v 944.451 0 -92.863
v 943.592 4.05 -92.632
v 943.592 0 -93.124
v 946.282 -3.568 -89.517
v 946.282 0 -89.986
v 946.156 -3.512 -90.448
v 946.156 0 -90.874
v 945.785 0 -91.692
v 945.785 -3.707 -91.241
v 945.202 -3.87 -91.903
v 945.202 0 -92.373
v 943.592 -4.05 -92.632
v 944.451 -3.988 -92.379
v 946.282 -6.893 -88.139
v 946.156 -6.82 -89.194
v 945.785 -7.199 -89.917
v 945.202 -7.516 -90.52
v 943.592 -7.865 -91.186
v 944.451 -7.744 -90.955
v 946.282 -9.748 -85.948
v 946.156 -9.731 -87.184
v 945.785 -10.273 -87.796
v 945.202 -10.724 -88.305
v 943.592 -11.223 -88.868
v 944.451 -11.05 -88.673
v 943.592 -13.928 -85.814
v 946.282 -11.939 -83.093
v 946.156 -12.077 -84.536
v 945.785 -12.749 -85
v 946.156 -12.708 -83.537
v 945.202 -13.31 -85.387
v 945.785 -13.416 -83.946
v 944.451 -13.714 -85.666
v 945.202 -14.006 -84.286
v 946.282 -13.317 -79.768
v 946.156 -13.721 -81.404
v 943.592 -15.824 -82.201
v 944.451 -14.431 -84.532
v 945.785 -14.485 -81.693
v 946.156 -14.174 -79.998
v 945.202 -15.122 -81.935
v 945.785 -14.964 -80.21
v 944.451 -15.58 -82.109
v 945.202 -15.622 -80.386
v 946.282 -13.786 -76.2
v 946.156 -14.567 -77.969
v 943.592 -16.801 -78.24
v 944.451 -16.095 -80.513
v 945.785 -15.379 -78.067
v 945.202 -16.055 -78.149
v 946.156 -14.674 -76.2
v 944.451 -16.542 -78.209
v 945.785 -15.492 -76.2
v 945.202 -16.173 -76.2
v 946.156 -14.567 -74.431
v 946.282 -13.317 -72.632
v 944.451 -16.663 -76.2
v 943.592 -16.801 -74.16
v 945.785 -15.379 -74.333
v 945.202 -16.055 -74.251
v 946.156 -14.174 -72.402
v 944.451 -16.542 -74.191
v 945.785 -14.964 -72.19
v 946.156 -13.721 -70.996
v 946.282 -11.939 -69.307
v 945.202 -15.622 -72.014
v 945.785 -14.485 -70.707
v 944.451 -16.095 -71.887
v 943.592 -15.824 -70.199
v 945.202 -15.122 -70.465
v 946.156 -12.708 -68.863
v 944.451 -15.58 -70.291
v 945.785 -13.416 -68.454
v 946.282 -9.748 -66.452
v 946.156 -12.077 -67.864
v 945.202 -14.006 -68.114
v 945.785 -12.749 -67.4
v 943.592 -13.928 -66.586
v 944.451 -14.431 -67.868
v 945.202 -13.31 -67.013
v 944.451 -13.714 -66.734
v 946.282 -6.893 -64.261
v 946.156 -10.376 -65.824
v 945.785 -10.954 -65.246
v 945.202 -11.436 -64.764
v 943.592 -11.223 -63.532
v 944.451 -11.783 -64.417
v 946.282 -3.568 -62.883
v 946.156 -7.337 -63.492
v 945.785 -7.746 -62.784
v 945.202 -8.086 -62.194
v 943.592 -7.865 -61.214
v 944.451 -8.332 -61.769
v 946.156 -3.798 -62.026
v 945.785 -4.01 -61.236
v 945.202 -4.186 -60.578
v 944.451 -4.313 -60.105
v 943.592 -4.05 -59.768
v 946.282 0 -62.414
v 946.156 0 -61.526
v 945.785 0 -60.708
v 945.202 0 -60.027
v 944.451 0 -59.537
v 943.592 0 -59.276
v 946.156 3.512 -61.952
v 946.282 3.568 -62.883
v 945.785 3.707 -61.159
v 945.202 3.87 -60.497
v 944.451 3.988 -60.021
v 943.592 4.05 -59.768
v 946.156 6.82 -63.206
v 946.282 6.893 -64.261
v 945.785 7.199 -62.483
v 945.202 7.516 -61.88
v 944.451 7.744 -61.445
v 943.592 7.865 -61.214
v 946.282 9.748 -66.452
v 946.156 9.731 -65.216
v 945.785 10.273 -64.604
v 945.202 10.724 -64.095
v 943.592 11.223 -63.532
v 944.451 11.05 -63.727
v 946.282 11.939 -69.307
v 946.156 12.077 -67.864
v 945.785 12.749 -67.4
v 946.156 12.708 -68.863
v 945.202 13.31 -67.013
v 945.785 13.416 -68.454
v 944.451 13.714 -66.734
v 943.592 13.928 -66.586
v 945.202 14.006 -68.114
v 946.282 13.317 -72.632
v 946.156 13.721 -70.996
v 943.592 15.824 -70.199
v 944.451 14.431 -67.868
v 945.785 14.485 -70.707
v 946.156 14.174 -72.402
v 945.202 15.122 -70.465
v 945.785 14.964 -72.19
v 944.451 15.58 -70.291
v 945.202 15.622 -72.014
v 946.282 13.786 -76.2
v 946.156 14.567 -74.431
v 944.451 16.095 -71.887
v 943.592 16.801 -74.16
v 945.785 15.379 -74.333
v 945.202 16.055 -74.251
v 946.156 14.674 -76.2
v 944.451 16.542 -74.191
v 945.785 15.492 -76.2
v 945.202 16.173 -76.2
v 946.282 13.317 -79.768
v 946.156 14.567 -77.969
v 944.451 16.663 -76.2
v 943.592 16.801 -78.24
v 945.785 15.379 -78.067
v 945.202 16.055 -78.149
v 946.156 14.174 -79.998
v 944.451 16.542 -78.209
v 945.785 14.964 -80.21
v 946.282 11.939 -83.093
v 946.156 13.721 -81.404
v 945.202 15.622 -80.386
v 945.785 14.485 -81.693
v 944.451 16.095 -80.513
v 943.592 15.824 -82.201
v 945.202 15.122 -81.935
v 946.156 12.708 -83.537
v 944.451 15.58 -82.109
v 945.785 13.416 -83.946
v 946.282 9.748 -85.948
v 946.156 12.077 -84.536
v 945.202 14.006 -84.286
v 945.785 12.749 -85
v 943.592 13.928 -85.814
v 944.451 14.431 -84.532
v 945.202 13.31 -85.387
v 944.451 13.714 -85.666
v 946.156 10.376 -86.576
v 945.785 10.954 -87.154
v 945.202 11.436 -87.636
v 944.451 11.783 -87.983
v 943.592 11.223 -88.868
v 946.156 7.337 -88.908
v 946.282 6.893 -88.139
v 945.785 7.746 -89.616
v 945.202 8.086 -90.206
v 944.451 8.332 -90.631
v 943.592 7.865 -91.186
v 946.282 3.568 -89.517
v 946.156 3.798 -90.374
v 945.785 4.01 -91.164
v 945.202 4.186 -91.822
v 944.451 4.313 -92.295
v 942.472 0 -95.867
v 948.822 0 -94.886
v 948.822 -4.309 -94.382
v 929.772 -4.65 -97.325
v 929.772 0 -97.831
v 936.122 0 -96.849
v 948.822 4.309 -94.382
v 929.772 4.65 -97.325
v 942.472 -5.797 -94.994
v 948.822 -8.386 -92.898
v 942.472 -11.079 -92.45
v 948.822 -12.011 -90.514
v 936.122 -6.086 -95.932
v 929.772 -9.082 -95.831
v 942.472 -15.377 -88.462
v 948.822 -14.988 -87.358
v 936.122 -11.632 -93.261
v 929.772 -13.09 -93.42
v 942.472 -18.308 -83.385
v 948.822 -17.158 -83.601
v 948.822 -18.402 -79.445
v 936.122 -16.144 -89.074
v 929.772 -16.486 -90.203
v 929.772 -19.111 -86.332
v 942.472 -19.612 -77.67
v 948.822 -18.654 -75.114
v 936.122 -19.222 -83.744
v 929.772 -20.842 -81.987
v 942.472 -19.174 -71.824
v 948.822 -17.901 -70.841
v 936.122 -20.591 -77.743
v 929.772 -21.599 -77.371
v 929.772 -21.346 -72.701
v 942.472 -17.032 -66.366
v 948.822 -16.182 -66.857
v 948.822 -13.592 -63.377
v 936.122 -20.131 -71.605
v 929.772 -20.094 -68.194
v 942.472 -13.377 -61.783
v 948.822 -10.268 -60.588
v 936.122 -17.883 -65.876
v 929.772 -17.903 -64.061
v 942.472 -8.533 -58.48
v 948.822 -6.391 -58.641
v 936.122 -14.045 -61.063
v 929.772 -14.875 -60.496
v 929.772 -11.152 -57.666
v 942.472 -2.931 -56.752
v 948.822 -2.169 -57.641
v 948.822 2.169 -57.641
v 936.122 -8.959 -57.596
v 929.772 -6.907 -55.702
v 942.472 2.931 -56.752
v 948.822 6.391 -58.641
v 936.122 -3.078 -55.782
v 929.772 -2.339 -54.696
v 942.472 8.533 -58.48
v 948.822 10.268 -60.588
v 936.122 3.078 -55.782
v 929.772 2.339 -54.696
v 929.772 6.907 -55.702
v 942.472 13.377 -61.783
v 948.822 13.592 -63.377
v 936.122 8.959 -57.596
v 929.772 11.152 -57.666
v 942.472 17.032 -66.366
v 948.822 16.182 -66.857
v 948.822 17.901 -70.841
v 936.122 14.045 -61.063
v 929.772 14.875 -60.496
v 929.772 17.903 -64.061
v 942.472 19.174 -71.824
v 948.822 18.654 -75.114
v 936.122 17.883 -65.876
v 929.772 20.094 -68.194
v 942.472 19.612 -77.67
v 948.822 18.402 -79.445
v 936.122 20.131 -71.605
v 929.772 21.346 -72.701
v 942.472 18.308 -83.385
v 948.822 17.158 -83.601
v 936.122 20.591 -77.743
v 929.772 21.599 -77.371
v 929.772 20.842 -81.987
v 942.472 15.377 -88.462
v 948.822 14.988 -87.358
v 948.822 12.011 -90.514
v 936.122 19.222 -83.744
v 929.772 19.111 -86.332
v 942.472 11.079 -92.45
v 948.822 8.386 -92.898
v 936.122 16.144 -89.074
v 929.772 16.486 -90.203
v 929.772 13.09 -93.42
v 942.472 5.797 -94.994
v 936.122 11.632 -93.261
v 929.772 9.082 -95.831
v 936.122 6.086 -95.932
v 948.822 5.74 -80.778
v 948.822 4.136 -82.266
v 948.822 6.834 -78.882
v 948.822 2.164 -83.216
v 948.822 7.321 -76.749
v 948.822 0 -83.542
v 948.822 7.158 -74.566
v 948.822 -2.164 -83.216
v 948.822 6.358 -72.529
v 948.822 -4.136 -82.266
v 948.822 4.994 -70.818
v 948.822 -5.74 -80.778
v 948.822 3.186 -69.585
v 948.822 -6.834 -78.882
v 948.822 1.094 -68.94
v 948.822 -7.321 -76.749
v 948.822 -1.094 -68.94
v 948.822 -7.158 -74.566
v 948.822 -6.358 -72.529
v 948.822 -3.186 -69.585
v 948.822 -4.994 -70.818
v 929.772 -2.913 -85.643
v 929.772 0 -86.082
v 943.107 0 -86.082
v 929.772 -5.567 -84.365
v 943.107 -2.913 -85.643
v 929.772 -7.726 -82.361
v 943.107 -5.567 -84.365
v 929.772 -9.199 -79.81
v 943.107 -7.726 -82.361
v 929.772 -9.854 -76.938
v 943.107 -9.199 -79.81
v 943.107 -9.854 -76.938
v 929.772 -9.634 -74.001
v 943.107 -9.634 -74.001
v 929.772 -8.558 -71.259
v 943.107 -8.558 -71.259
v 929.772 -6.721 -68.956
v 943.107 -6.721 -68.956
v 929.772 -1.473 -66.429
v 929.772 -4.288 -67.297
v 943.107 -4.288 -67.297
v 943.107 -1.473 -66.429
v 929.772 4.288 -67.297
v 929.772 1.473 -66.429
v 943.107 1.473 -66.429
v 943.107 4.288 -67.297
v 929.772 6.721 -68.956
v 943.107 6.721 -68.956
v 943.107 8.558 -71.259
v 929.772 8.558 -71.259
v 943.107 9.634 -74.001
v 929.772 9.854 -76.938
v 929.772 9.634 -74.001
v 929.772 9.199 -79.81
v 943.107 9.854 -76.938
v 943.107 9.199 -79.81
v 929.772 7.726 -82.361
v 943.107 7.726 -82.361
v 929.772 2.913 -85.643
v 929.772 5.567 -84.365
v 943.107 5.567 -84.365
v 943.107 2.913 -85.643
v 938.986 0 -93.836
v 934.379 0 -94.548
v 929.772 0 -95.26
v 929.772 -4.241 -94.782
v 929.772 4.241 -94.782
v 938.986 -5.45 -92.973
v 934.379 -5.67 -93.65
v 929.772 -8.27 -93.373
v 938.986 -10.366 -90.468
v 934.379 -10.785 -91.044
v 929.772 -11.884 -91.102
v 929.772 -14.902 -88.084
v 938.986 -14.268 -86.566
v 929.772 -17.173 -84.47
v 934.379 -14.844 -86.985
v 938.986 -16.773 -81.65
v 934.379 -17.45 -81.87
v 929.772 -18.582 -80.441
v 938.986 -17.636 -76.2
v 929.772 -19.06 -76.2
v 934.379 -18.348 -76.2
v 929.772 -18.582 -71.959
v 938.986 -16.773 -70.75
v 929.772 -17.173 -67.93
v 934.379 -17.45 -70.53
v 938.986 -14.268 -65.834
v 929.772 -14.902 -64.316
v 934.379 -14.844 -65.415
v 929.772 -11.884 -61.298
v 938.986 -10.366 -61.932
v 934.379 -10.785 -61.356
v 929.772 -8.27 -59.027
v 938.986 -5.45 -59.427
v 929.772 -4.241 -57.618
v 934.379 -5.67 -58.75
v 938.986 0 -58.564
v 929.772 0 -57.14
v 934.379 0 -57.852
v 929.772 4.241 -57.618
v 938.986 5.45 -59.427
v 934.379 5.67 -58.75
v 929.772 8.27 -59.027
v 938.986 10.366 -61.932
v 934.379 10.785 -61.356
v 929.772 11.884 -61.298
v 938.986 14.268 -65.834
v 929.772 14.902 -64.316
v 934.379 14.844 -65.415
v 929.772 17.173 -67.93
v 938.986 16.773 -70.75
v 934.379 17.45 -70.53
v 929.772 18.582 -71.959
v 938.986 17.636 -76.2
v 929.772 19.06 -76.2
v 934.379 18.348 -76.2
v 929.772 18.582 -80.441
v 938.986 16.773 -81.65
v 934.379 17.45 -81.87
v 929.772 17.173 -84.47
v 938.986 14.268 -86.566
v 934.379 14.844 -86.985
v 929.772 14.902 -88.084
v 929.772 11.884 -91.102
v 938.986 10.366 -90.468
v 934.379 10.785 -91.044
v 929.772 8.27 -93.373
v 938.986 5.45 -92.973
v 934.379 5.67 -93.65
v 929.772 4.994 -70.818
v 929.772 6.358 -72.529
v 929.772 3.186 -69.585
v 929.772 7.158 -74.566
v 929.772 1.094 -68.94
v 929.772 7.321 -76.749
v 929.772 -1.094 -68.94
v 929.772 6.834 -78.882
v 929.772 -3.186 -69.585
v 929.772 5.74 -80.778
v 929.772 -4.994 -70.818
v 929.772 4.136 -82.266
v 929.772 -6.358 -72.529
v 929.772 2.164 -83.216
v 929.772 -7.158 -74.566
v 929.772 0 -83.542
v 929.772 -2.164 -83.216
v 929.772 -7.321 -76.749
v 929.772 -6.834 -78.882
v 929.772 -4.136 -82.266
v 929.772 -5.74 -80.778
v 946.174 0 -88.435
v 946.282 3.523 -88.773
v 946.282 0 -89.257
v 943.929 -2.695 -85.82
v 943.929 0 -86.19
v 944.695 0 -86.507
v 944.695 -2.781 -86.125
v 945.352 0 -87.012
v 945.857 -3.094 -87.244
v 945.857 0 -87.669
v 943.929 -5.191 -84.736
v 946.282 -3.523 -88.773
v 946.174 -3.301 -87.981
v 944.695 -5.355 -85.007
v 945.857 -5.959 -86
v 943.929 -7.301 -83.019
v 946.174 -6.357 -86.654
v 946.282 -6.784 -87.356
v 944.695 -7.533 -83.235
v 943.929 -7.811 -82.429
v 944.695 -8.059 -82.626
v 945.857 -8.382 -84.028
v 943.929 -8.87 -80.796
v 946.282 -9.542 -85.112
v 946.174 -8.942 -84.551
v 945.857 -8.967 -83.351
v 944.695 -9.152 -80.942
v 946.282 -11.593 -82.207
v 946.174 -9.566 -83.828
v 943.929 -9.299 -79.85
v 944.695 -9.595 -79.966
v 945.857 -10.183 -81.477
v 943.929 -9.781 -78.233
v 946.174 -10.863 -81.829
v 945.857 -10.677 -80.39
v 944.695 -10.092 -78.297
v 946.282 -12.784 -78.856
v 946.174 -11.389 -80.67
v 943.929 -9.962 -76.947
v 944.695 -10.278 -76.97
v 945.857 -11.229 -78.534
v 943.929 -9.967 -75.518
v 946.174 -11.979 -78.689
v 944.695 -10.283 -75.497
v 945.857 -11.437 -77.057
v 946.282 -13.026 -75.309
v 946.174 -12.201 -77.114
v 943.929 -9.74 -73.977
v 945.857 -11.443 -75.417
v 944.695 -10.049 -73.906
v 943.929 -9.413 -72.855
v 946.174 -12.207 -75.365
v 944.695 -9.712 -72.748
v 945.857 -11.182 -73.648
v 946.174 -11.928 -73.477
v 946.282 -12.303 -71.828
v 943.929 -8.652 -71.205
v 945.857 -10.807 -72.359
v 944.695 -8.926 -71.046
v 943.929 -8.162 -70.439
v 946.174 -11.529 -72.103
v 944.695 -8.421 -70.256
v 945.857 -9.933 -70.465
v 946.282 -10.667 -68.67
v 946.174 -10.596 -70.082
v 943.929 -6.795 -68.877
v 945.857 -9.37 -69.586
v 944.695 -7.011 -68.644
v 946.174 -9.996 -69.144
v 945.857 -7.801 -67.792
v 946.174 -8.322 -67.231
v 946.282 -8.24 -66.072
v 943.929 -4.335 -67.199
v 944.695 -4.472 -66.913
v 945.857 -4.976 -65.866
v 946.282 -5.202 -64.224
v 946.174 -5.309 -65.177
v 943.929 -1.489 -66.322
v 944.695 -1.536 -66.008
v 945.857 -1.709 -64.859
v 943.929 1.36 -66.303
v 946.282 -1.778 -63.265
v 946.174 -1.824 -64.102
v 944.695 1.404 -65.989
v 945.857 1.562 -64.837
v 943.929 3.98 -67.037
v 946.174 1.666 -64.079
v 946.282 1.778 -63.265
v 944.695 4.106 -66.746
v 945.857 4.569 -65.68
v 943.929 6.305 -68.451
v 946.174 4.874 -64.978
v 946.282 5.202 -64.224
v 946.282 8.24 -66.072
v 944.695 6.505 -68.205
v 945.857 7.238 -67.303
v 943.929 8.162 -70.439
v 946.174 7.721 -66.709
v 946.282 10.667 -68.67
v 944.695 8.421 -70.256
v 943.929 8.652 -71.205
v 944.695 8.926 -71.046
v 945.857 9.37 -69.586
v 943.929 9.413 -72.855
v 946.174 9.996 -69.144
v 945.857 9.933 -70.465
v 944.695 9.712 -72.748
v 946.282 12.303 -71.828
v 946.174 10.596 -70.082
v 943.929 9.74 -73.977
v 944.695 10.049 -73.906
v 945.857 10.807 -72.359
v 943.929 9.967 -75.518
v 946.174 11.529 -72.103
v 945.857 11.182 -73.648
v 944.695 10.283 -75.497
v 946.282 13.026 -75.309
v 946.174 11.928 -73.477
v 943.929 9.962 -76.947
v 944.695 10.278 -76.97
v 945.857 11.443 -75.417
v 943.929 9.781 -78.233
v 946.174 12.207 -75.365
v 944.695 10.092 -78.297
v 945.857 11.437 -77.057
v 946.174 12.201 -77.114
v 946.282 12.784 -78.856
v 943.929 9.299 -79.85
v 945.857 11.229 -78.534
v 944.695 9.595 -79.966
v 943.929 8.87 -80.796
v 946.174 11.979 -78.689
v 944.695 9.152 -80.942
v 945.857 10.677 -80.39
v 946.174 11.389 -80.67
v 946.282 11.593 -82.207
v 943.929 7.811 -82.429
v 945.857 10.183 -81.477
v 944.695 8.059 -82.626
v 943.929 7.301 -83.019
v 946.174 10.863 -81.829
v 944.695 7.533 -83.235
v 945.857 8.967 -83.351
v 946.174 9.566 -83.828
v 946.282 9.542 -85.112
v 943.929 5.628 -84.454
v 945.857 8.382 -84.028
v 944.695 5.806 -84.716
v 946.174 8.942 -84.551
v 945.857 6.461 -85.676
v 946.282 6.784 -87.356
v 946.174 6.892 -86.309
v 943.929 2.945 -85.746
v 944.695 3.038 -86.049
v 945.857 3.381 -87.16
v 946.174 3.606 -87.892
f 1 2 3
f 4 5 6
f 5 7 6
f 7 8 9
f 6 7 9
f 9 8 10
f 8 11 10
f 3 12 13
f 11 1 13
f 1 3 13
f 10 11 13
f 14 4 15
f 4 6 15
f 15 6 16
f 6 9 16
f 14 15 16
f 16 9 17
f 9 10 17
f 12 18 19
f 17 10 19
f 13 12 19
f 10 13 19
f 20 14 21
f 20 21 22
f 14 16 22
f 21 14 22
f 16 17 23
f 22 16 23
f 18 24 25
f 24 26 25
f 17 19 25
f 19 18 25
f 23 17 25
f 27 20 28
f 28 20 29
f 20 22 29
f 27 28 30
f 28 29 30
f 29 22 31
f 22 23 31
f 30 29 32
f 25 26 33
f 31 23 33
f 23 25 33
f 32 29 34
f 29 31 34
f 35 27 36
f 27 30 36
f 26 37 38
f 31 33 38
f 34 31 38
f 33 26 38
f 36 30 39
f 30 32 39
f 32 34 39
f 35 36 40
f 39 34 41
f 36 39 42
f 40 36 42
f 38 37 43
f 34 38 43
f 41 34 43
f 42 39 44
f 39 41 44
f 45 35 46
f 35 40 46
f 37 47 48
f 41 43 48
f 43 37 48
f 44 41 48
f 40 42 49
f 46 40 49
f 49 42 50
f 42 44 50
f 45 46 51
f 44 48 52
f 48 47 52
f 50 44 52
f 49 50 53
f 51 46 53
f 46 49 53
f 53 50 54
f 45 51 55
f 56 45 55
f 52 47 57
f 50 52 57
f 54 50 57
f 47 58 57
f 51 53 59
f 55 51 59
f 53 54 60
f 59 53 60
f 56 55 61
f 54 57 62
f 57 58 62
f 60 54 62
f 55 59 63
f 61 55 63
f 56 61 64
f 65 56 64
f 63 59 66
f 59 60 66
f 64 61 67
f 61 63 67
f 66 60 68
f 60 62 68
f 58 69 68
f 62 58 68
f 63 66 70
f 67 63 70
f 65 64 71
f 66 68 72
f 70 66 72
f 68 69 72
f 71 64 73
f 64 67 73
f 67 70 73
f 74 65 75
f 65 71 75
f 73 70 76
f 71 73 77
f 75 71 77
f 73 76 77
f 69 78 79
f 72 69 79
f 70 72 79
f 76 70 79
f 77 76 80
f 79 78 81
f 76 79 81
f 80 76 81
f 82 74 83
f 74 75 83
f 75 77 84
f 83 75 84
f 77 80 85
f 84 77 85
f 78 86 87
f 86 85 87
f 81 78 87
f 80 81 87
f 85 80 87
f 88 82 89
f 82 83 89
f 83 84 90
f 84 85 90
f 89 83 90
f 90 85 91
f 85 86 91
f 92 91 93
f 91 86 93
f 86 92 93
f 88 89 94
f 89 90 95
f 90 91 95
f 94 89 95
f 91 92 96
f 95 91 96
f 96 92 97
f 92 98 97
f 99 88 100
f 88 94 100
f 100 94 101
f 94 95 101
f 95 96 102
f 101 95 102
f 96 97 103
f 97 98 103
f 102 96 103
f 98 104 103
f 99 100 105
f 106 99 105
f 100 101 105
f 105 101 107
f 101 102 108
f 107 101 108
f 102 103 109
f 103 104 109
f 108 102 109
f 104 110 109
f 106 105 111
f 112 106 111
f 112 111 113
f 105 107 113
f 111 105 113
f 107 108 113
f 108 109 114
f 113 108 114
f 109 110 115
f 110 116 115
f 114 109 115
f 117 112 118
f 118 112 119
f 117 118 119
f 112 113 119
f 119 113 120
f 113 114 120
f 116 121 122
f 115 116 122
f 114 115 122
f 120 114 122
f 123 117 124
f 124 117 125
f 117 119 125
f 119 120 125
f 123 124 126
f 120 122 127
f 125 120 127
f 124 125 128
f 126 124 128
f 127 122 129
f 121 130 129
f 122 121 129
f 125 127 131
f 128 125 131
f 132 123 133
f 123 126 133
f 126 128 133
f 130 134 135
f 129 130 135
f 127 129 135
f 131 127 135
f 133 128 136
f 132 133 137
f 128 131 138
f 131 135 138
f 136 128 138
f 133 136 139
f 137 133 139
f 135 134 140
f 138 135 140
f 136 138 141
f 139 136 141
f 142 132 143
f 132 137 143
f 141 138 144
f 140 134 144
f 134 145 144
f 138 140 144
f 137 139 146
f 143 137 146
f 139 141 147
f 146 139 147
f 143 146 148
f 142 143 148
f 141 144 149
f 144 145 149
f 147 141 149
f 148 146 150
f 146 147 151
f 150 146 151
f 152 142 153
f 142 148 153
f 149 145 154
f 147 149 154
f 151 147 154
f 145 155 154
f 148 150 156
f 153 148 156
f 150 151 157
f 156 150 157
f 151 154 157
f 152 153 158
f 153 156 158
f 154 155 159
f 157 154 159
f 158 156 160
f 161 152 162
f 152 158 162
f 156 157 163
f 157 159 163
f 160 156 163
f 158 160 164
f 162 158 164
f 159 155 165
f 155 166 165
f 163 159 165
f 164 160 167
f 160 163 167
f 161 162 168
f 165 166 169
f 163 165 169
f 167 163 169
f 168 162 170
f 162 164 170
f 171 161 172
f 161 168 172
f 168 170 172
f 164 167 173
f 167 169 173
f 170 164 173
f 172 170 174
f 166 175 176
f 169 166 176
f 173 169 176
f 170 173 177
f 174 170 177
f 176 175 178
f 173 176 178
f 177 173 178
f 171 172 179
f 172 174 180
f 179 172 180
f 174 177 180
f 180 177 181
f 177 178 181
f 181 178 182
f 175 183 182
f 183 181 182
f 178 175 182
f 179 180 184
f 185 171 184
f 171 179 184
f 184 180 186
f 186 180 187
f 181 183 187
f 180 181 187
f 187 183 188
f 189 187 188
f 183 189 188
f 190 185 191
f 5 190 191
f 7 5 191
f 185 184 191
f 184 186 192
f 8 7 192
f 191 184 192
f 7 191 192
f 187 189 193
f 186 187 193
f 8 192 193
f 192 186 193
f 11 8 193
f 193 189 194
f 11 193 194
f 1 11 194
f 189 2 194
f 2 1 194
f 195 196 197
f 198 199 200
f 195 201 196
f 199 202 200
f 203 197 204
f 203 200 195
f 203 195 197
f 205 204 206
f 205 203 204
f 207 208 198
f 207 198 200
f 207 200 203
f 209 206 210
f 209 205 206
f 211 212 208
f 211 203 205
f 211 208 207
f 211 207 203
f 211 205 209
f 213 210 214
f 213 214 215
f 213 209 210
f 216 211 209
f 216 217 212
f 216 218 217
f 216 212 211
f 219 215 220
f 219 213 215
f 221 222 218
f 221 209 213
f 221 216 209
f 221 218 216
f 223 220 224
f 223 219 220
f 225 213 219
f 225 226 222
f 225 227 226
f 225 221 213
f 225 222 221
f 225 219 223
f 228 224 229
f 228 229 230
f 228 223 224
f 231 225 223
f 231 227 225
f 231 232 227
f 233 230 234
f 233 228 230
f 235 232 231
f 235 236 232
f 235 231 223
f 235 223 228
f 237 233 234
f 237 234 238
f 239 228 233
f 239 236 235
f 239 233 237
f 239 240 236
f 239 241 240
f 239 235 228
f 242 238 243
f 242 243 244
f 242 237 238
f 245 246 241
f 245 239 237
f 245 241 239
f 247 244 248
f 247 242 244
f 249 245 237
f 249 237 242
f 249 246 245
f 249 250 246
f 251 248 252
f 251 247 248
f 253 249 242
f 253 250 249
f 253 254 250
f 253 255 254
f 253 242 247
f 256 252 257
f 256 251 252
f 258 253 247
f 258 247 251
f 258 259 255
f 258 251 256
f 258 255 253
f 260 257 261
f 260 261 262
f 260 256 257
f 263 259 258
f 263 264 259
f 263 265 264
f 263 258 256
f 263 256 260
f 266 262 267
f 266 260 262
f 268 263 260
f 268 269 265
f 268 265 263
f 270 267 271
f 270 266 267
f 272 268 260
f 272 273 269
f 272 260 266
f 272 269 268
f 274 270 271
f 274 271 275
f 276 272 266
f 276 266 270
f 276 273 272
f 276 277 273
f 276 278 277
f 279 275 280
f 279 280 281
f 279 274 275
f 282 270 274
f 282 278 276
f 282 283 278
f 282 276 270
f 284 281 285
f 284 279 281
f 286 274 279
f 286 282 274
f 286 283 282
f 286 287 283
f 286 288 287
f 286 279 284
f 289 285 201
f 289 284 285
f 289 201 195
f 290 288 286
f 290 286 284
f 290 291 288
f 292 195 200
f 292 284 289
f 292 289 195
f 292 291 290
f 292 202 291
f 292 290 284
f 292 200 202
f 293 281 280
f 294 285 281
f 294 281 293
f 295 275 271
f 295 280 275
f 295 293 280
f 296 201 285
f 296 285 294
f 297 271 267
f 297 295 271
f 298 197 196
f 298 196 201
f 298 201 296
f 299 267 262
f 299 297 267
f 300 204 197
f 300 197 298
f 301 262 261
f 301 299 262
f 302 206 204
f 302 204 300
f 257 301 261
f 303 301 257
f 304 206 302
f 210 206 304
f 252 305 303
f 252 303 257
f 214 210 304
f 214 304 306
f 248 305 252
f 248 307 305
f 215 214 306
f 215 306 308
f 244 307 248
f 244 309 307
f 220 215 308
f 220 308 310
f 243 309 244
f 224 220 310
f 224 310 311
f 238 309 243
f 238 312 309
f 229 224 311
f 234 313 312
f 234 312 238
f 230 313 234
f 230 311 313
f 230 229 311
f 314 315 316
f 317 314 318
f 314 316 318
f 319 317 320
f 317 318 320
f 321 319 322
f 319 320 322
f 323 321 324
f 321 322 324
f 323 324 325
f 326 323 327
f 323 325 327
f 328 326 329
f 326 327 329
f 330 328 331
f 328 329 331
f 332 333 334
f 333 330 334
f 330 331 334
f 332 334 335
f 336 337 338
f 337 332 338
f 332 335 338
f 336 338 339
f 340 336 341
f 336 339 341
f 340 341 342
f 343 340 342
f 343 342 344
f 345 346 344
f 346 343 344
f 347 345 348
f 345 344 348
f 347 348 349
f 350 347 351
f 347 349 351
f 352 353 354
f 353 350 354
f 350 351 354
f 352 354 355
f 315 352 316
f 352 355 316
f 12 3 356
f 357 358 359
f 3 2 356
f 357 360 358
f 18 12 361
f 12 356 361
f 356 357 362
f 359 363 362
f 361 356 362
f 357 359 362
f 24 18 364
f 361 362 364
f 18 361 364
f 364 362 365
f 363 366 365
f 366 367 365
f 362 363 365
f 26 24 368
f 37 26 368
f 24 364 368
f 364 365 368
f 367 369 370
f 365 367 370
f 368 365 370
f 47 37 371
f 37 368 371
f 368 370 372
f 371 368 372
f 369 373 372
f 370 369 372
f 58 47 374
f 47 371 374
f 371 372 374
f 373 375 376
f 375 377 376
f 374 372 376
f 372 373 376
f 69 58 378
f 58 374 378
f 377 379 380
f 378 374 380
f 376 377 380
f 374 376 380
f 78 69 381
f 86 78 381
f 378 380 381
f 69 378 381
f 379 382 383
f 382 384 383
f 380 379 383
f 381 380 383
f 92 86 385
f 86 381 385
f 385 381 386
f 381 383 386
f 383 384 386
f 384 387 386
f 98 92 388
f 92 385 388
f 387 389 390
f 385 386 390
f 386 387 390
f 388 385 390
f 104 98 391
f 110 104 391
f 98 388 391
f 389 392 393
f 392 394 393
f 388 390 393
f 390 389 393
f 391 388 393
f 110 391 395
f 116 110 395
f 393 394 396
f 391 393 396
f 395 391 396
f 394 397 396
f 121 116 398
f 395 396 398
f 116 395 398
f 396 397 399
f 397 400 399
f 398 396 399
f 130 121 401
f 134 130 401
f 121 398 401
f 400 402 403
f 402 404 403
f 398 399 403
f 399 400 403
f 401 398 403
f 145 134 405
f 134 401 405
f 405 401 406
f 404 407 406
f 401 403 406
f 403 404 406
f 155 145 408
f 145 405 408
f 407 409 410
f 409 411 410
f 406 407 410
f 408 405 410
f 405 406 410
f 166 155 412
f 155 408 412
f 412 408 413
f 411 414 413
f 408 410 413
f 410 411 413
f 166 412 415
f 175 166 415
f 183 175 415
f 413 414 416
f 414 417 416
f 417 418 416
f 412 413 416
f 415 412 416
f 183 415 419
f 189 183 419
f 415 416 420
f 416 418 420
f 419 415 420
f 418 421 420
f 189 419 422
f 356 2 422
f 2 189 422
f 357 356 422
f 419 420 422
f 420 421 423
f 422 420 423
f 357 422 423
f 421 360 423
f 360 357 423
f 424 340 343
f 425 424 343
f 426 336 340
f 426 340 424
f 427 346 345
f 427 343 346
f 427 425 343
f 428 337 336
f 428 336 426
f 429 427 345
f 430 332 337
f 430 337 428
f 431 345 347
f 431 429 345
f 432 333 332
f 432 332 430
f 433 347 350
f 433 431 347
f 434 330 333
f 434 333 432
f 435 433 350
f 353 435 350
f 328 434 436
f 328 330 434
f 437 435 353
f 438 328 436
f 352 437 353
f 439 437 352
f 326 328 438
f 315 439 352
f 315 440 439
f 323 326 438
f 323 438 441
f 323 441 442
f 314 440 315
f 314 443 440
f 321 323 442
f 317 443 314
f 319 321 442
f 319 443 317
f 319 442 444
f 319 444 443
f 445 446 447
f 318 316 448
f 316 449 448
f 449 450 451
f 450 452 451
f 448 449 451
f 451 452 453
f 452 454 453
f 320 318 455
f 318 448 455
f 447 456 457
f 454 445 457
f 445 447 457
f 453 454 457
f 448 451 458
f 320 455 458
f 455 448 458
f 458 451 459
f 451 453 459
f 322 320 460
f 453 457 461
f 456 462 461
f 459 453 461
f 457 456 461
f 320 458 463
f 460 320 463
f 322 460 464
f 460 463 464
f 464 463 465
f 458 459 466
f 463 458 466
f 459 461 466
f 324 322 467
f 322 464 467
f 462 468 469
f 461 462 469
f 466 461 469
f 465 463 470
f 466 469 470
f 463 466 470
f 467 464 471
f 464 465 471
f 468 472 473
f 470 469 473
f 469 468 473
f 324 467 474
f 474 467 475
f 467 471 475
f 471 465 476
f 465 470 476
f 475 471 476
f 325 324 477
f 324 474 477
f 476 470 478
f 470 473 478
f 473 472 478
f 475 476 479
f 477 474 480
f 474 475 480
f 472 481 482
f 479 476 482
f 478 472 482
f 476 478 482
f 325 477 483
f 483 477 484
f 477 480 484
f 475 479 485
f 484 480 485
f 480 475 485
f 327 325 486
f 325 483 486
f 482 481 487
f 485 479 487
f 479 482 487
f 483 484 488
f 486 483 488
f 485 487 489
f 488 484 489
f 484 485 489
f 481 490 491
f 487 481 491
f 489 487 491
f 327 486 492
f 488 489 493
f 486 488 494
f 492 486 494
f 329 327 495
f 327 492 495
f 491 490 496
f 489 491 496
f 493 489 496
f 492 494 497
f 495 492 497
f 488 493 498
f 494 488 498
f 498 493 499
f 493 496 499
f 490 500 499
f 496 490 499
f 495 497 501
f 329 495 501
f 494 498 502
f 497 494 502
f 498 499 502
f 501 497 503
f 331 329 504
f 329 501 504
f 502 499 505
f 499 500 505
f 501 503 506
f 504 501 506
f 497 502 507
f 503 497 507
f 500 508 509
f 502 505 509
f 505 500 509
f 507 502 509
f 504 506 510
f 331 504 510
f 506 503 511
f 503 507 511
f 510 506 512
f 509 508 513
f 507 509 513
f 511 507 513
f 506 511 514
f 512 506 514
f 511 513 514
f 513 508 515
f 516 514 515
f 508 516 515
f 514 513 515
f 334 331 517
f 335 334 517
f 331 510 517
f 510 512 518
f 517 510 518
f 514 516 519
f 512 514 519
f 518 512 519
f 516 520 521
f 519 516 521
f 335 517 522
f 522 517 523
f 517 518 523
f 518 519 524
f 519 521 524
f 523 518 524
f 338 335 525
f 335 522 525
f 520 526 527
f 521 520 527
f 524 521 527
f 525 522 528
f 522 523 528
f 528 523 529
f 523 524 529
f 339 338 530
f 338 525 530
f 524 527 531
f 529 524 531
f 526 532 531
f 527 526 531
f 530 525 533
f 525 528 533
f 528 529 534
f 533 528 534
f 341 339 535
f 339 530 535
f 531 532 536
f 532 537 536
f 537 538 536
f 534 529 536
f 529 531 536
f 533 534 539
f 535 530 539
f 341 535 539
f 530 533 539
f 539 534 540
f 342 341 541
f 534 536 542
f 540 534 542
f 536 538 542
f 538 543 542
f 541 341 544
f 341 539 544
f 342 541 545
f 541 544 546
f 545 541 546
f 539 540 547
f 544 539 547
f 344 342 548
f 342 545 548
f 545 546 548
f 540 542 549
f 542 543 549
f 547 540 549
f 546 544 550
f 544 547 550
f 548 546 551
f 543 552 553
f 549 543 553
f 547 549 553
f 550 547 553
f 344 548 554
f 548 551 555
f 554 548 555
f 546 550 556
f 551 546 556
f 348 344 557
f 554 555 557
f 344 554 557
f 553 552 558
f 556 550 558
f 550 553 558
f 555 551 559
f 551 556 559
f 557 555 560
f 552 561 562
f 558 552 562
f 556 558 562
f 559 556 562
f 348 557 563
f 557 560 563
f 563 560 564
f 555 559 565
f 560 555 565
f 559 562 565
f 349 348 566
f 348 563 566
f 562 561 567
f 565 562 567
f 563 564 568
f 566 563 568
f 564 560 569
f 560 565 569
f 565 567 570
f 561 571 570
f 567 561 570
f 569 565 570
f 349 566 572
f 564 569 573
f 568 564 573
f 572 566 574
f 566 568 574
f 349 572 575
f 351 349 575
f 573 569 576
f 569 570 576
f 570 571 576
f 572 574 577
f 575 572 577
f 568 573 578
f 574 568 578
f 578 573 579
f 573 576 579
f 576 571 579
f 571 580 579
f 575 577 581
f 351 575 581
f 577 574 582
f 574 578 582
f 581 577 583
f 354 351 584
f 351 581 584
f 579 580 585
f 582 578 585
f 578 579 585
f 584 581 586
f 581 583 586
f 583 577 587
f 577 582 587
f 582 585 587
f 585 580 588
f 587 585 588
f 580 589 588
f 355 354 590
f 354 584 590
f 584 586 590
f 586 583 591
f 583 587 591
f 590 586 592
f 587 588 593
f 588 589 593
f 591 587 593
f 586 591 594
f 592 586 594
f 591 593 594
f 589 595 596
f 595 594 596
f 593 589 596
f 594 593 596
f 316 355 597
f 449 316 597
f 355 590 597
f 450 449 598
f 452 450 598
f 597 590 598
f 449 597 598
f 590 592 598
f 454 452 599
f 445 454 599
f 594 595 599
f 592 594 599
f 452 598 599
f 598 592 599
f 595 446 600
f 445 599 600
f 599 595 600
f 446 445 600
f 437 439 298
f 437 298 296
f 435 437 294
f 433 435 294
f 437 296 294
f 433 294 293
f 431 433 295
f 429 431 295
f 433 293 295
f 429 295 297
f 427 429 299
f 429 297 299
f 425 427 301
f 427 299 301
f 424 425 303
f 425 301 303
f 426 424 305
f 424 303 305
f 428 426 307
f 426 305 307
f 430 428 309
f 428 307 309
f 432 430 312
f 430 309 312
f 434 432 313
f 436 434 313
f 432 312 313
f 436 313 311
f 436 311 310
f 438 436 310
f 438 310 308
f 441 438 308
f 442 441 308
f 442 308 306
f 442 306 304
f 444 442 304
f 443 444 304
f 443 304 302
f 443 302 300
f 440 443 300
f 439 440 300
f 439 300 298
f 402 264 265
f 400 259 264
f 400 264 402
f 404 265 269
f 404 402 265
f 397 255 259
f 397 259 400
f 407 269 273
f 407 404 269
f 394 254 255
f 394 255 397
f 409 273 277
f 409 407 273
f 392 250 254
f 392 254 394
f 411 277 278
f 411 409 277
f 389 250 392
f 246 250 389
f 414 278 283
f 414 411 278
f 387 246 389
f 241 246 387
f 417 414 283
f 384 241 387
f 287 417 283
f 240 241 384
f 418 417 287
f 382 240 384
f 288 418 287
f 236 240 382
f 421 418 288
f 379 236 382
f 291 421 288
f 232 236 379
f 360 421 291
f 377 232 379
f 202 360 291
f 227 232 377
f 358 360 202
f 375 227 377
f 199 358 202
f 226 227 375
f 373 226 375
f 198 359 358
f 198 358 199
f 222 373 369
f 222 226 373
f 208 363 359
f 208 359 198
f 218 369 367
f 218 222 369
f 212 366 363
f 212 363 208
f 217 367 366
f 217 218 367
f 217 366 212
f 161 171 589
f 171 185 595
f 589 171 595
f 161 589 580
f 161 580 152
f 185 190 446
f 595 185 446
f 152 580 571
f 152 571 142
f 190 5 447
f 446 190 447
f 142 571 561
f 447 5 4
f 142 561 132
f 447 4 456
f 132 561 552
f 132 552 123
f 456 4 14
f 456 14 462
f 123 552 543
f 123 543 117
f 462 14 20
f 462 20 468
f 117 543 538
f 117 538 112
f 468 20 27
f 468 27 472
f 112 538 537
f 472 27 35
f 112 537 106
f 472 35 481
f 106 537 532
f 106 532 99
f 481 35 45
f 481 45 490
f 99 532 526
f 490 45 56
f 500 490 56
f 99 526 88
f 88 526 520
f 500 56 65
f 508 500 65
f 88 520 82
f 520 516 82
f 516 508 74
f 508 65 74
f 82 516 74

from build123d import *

# Parameters (mm, degrees)
TAPPED_HOLE_FOR_9_16_12_HELICOIL1_D = 14.68374


with BuildPart() as part:
    # Sketch1 → Revolve2 (revolve)
    with BuildSketch(Plane(origin=(0, 0, 0), x_dir=(1, 0, 0), z_dir=(0, 1, 0))):
        Polygon((929.772285353, 97.830519041), (929.772285353, 76.2), (948.822285353, 76.2), (948.822285353, 94.885801773), align=None)
    revolve(axis=Axis((1049.721128595, 0, -76.2), (-1, 0, 0)))

    # Tapped Hole for 9/16-12 Helicoil1 (through all)
    with Locations(Plane.ZY.offset(-929.772285353)):
        with Locations((-76.2, 0)):
            Hole(TAPPED_HOLE_FOR_9_16_12_HELICOIL1_D / 2)

    # Sketch5 → Cut-Revolve1 (revolve, cut)
    with BuildSketch(Plane(origin=(0, 0, 0), x_dir=(1, 0, 0), z_dir=(0, 1, 0))):
        with BuildLine():
            Line((927.609152682, 95.594725662), (927.609152682, 86.08187))
            Line((927.609152682, 86.08187), (943.107285353, 86.08187))
            ThreePointArc((943.107285353, 86.08187), (945.352349383, 87.01180597), (946.282285353, 89.25687))
            Line((946.282285353, 89.25687), (946.282285353, 89.986341597))
            ThreePointArc((946.282285353, 89.986341597), (945.517739835, 92.052820291), (943.592311059, 93.124075663))
            Line((943.592311059, 93.124075663), (927.609152682, 95.594725662))
        make_face()
    revolve(axis=Axis((1049.721128595, 0, -76.2), (-1, 0, 0)), mode=Mode.SUBTRACT)


solid = part.part
